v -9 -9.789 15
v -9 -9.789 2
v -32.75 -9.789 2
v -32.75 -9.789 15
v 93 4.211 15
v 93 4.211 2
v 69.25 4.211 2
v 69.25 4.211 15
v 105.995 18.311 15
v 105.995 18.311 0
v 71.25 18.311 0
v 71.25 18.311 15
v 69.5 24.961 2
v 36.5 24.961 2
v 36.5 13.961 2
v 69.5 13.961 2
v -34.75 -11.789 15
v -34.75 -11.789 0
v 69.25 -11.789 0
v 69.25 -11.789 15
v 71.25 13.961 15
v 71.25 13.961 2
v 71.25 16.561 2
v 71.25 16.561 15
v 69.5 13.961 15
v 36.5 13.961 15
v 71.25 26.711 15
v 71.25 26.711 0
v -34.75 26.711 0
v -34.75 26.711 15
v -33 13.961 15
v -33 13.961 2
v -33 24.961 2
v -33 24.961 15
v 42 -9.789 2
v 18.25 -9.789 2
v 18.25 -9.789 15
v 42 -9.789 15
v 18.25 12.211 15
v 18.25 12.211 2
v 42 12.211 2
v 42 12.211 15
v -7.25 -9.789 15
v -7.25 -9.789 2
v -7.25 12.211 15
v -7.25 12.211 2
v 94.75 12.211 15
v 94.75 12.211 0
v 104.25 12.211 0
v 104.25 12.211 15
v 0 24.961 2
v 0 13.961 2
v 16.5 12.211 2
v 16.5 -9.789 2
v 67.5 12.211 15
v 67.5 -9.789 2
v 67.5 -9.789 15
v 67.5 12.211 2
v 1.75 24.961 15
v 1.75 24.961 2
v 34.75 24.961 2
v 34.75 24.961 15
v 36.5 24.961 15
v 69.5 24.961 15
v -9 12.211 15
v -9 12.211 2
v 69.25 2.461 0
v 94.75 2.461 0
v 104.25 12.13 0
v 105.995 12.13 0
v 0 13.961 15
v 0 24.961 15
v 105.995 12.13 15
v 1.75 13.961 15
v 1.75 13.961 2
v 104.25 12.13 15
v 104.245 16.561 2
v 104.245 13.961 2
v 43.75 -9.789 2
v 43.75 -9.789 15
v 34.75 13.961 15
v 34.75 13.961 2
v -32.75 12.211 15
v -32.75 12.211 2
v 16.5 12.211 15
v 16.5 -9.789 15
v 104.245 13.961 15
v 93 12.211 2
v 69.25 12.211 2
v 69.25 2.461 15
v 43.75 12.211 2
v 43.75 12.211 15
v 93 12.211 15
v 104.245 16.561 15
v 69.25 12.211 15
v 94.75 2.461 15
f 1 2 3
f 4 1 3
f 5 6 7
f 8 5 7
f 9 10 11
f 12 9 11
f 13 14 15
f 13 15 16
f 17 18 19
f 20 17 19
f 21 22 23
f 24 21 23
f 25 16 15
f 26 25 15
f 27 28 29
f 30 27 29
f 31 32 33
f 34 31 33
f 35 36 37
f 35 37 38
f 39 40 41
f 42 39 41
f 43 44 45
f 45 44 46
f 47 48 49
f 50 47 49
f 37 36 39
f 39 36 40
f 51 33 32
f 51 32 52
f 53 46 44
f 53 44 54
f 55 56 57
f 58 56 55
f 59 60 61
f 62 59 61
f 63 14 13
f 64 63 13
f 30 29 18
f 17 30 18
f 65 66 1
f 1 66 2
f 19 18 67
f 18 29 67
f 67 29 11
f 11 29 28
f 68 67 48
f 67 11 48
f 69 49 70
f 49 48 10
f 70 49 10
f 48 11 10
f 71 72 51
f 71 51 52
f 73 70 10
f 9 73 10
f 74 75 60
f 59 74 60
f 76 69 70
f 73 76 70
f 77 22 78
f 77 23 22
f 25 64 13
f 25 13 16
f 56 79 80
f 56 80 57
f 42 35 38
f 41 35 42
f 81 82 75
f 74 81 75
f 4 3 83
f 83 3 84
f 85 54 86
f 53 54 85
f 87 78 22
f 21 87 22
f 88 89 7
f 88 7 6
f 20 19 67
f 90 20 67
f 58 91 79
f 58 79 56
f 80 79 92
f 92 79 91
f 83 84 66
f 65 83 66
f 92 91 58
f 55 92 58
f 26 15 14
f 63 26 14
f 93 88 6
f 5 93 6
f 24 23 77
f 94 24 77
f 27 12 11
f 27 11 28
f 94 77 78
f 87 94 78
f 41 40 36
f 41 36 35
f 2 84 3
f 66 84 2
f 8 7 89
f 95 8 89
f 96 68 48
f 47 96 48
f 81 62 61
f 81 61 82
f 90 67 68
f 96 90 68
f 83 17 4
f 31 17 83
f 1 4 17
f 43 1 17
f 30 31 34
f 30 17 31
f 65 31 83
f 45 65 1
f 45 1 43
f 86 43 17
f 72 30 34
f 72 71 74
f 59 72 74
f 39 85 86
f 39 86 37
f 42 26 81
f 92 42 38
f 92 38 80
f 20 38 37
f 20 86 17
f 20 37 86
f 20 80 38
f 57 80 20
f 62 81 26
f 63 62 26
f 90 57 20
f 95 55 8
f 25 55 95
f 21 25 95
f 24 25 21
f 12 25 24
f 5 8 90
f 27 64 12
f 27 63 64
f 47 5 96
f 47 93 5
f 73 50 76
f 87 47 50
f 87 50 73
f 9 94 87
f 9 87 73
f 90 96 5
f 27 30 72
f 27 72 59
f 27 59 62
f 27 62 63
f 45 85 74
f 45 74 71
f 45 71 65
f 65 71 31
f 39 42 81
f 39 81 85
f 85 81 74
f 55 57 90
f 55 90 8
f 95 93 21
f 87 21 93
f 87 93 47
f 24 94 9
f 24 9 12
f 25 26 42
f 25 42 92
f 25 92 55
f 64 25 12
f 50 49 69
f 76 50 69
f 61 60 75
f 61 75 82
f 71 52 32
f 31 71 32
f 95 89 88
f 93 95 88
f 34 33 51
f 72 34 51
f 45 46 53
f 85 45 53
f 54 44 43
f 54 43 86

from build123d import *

# Parameters (mm, degrees)
F0_W     = 23.75
F0_H     = 22
F1_DEPTH = 15
F2_DEPTH = 2
F3_DEPTH = 2


with BuildPart() as f1:
    # F0 (on Top) → F1 (new body)
    with BuildSketch(Plane.XY):
        Polygon((-34.75, -9.78861), (-34.75, -11.78861), (69.25, -11.78861), (69.25, 2.46139), (94.75, 2.46139), (94.75, 12.21139), (104.25, 12.21139), (104.25, 12.13003), (105.9946, 12.13003), (105.9946, 18.31139), (104.25, 18.31139), (71.25, 18.31139), (71.25, 24.96139), (71.25, 26.71139), (-26.958708, 26.71139), (-34.75, 26.71139), (-34.75, 24.96139), (-34.75, 13.96139), (-34.75, 12.21139), align=None)
        Polygon((-32.75, -9.78861), (-32.75, 12.21139), (-19.336179, 12.21139), (-9, 12.21139), (-9, -9.78861), (-19.336179, -9.78861), align=None, mode=Mode.SUBTRACT)
        with Locations((4.625, 1.21139)):
            Rectangle(F0_W, F0_H, mode=Mode.SUBTRACT)
        with Locations((30.125, 1.21139)):
            Rectangle(F0_W, F0_H, mode=Mode.SUBTRACT)
        with Locations((55.625, 1.21139)):
            Rectangle(F0_W, F0_H, mode=Mode.SUBTRACT)
        Polygon((0, 13.96139), (-33, 13.96139), (-33, 24.96139), (-26.958708, 24.96139), (0, 24.96139), align=None, mode=Mode.SUBTRACT)
        Polygon((1.75, 13.96139), (1.75, 24.96139), (24.202205, 24.96139), (32.815558, 24.96139), (34.75, 24.96139), (34.75, 13.96139), (32.815558, 13.96139), (24.202205, 13.96139), align=None, mode=Mode.SUBTRACT)
        Polygon((69.25, 4.21139), (69.25, 12.21139), (87.25, 12.21139), (93, 12.21139), (93, 4.21139), align=None, mode=Mode.SUBTRACT)
        Polygon((102.25, 13.96139), (71.25, 13.96139), (71.25, 16.56139), (104.2446, 16.56139), (104.2446, 13.96139), align=None, mode=Mode.SUBTRACT)
        Polygon((36.5, 13.96139), (36.5, 24.96139), (69.5, 24.96139), (69.5, 18.31139), (69.5, 16.56139), (69.5, 13.96139), (69.25, 13.96139), (63.25, 13.96139), align=None, mode=Mode.SUBTRACT)
    extrude(amount=F1_DEPTH)

    # F0 (on Top) → F2 (join)
    with BuildSketch(Plane.XY):
        Polygon((-34.75, -9.78861), (-34.75, -11.78861), (69.25, -11.78861), (69.25, 2.46139), (94.75, 2.46139), (94.75, 12.21139), (104.25, 12.21139), (104.25, 12.13003), (105.9946, 12.13003), (105.9946, 18.31139), (104.25, 18.31139), (71.25, 18.31139), (71.25, 24.96139), (71.25, 26.71139), (-26.958708, 26.71139), (-34.75, 26.71139), (-34.75, 24.96139), (-34.75, 13.96139), (-34.75, 12.21139), align=None)
        Polygon((-32.75, -9.78861), (-32.75, 12.21139), (-19.336179, 12.21139), (-9, 12.21139), (-9, -9.78861), (-19.336179, -9.78861), align=None, mode=Mode.SUBTRACT)
        with Locations((4.625, 1.21139)):
            Rectangle(F0_W, F0_H, mode=Mode.SUBTRACT)
        with Locations((30.125, 1.21139)):
            Rectangle(F0_W, F0_H, mode=Mode.SUBTRACT)
        with Locations((55.625, 1.21139)):
            Rectangle(F0_W, F0_H, mode=Mode.SUBTRACT)
        Polygon((0, 13.96139), (-33, 13.96139), (-33, 24.96139), (-26.958708, 24.96139), (0, 24.96139), align=None, mode=Mode.SUBTRACT)
        Polygon((1.75, 13.96139), (1.75, 24.96139), (24.202205, 24.96139), (32.815558, 24.96139), (34.75, 24.96139), (34.75, 13.96139), (32.815558, 13.96139), (24.202205, 13.96139), align=None, mode=Mode.SUBTRACT)
        Polygon((69.25, 4.21139), (69.25, 12.21139), (87.25, 12.21139), (93, 12.21139), (93, 4.21139), align=None, mode=Mode.SUBTRACT)
        Polygon((102.25, 13.96139), (71.25, 13.96139), (71.25, 16.56139), (104.2446, 16.56139), (104.2446, 13.96139), align=None, mode=Mode.SUBTRACT)
        Polygon((36.5, 13.96139), (36.5, 24.96139), (69.5, 24.96139), (69.5, 18.31139), (69.5, 16.56139), (69.5, 13.96139), (69.25, 13.96139), (63.25, 13.96139), align=None, mode=Mode.SUBTRACT)
        Polygon((71.25, 16.56139), (71.25, 13.96139), (102.25, 13.96139), (104.2446, 13.96139), (104.2446, 16.56139), align=None)
    extrude(amount=F2_DEPTH)

    # F0 (on Top) → F3 (join)
    with BuildSketch(Plane.XY):
        Polygon((69.5, 24.96139), (36.5, 24.96139), (36.5, 13.96139), (63.25, 13.96139), (69.25, 13.96139), (69.5, 13.96139), (69.5, 16.56139), (69.5, 18.31139), align=None)
        with Locations((55.625, 1.21139)):
            Rectangle(F0_W, F0_H)
        Polygon((87.25, 12.21139), (69.25, 12.21139), (69.25, 4.21139), (93, 4.21139), (93, 12.21139), align=None)
        with Locations((30.125, 1.21139)):
            Rectangle(F0_W, F0_H)
        Polygon((24.202205, 24.96139), (1.75, 24.96139), (1.75, 13.96139), (24.202205, 13.96139), (32.815558, 13.96139), (34.75, 13.96139), (34.75, 24.96139), (32.815558, 24.96139), align=None)
        with Locations((4.625, 1.21139)):
            Rectangle(F0_W, F0_H)
        Polygon((-33, 24.96139), (-33, 13.96139), (0, 13.96139), (0, 24.96139), (-26.958708, 24.96139), align=None)
        Polygon((-19.336179, 12.21139), (-32.75, 12.21139), (-32.75, -9.78861), (-19.336179, -9.78861), (-9, -9.78861), (-9, 12.21139), align=None)
        Polygon((71.25, 16.56139), (71.25, 13.96139), (102.25, 13.96139), (104.2446, 13.96139), (104.2446, 16.56139), align=None)
    extrude(amount=F3_DEPTH)


solid = f1.part
